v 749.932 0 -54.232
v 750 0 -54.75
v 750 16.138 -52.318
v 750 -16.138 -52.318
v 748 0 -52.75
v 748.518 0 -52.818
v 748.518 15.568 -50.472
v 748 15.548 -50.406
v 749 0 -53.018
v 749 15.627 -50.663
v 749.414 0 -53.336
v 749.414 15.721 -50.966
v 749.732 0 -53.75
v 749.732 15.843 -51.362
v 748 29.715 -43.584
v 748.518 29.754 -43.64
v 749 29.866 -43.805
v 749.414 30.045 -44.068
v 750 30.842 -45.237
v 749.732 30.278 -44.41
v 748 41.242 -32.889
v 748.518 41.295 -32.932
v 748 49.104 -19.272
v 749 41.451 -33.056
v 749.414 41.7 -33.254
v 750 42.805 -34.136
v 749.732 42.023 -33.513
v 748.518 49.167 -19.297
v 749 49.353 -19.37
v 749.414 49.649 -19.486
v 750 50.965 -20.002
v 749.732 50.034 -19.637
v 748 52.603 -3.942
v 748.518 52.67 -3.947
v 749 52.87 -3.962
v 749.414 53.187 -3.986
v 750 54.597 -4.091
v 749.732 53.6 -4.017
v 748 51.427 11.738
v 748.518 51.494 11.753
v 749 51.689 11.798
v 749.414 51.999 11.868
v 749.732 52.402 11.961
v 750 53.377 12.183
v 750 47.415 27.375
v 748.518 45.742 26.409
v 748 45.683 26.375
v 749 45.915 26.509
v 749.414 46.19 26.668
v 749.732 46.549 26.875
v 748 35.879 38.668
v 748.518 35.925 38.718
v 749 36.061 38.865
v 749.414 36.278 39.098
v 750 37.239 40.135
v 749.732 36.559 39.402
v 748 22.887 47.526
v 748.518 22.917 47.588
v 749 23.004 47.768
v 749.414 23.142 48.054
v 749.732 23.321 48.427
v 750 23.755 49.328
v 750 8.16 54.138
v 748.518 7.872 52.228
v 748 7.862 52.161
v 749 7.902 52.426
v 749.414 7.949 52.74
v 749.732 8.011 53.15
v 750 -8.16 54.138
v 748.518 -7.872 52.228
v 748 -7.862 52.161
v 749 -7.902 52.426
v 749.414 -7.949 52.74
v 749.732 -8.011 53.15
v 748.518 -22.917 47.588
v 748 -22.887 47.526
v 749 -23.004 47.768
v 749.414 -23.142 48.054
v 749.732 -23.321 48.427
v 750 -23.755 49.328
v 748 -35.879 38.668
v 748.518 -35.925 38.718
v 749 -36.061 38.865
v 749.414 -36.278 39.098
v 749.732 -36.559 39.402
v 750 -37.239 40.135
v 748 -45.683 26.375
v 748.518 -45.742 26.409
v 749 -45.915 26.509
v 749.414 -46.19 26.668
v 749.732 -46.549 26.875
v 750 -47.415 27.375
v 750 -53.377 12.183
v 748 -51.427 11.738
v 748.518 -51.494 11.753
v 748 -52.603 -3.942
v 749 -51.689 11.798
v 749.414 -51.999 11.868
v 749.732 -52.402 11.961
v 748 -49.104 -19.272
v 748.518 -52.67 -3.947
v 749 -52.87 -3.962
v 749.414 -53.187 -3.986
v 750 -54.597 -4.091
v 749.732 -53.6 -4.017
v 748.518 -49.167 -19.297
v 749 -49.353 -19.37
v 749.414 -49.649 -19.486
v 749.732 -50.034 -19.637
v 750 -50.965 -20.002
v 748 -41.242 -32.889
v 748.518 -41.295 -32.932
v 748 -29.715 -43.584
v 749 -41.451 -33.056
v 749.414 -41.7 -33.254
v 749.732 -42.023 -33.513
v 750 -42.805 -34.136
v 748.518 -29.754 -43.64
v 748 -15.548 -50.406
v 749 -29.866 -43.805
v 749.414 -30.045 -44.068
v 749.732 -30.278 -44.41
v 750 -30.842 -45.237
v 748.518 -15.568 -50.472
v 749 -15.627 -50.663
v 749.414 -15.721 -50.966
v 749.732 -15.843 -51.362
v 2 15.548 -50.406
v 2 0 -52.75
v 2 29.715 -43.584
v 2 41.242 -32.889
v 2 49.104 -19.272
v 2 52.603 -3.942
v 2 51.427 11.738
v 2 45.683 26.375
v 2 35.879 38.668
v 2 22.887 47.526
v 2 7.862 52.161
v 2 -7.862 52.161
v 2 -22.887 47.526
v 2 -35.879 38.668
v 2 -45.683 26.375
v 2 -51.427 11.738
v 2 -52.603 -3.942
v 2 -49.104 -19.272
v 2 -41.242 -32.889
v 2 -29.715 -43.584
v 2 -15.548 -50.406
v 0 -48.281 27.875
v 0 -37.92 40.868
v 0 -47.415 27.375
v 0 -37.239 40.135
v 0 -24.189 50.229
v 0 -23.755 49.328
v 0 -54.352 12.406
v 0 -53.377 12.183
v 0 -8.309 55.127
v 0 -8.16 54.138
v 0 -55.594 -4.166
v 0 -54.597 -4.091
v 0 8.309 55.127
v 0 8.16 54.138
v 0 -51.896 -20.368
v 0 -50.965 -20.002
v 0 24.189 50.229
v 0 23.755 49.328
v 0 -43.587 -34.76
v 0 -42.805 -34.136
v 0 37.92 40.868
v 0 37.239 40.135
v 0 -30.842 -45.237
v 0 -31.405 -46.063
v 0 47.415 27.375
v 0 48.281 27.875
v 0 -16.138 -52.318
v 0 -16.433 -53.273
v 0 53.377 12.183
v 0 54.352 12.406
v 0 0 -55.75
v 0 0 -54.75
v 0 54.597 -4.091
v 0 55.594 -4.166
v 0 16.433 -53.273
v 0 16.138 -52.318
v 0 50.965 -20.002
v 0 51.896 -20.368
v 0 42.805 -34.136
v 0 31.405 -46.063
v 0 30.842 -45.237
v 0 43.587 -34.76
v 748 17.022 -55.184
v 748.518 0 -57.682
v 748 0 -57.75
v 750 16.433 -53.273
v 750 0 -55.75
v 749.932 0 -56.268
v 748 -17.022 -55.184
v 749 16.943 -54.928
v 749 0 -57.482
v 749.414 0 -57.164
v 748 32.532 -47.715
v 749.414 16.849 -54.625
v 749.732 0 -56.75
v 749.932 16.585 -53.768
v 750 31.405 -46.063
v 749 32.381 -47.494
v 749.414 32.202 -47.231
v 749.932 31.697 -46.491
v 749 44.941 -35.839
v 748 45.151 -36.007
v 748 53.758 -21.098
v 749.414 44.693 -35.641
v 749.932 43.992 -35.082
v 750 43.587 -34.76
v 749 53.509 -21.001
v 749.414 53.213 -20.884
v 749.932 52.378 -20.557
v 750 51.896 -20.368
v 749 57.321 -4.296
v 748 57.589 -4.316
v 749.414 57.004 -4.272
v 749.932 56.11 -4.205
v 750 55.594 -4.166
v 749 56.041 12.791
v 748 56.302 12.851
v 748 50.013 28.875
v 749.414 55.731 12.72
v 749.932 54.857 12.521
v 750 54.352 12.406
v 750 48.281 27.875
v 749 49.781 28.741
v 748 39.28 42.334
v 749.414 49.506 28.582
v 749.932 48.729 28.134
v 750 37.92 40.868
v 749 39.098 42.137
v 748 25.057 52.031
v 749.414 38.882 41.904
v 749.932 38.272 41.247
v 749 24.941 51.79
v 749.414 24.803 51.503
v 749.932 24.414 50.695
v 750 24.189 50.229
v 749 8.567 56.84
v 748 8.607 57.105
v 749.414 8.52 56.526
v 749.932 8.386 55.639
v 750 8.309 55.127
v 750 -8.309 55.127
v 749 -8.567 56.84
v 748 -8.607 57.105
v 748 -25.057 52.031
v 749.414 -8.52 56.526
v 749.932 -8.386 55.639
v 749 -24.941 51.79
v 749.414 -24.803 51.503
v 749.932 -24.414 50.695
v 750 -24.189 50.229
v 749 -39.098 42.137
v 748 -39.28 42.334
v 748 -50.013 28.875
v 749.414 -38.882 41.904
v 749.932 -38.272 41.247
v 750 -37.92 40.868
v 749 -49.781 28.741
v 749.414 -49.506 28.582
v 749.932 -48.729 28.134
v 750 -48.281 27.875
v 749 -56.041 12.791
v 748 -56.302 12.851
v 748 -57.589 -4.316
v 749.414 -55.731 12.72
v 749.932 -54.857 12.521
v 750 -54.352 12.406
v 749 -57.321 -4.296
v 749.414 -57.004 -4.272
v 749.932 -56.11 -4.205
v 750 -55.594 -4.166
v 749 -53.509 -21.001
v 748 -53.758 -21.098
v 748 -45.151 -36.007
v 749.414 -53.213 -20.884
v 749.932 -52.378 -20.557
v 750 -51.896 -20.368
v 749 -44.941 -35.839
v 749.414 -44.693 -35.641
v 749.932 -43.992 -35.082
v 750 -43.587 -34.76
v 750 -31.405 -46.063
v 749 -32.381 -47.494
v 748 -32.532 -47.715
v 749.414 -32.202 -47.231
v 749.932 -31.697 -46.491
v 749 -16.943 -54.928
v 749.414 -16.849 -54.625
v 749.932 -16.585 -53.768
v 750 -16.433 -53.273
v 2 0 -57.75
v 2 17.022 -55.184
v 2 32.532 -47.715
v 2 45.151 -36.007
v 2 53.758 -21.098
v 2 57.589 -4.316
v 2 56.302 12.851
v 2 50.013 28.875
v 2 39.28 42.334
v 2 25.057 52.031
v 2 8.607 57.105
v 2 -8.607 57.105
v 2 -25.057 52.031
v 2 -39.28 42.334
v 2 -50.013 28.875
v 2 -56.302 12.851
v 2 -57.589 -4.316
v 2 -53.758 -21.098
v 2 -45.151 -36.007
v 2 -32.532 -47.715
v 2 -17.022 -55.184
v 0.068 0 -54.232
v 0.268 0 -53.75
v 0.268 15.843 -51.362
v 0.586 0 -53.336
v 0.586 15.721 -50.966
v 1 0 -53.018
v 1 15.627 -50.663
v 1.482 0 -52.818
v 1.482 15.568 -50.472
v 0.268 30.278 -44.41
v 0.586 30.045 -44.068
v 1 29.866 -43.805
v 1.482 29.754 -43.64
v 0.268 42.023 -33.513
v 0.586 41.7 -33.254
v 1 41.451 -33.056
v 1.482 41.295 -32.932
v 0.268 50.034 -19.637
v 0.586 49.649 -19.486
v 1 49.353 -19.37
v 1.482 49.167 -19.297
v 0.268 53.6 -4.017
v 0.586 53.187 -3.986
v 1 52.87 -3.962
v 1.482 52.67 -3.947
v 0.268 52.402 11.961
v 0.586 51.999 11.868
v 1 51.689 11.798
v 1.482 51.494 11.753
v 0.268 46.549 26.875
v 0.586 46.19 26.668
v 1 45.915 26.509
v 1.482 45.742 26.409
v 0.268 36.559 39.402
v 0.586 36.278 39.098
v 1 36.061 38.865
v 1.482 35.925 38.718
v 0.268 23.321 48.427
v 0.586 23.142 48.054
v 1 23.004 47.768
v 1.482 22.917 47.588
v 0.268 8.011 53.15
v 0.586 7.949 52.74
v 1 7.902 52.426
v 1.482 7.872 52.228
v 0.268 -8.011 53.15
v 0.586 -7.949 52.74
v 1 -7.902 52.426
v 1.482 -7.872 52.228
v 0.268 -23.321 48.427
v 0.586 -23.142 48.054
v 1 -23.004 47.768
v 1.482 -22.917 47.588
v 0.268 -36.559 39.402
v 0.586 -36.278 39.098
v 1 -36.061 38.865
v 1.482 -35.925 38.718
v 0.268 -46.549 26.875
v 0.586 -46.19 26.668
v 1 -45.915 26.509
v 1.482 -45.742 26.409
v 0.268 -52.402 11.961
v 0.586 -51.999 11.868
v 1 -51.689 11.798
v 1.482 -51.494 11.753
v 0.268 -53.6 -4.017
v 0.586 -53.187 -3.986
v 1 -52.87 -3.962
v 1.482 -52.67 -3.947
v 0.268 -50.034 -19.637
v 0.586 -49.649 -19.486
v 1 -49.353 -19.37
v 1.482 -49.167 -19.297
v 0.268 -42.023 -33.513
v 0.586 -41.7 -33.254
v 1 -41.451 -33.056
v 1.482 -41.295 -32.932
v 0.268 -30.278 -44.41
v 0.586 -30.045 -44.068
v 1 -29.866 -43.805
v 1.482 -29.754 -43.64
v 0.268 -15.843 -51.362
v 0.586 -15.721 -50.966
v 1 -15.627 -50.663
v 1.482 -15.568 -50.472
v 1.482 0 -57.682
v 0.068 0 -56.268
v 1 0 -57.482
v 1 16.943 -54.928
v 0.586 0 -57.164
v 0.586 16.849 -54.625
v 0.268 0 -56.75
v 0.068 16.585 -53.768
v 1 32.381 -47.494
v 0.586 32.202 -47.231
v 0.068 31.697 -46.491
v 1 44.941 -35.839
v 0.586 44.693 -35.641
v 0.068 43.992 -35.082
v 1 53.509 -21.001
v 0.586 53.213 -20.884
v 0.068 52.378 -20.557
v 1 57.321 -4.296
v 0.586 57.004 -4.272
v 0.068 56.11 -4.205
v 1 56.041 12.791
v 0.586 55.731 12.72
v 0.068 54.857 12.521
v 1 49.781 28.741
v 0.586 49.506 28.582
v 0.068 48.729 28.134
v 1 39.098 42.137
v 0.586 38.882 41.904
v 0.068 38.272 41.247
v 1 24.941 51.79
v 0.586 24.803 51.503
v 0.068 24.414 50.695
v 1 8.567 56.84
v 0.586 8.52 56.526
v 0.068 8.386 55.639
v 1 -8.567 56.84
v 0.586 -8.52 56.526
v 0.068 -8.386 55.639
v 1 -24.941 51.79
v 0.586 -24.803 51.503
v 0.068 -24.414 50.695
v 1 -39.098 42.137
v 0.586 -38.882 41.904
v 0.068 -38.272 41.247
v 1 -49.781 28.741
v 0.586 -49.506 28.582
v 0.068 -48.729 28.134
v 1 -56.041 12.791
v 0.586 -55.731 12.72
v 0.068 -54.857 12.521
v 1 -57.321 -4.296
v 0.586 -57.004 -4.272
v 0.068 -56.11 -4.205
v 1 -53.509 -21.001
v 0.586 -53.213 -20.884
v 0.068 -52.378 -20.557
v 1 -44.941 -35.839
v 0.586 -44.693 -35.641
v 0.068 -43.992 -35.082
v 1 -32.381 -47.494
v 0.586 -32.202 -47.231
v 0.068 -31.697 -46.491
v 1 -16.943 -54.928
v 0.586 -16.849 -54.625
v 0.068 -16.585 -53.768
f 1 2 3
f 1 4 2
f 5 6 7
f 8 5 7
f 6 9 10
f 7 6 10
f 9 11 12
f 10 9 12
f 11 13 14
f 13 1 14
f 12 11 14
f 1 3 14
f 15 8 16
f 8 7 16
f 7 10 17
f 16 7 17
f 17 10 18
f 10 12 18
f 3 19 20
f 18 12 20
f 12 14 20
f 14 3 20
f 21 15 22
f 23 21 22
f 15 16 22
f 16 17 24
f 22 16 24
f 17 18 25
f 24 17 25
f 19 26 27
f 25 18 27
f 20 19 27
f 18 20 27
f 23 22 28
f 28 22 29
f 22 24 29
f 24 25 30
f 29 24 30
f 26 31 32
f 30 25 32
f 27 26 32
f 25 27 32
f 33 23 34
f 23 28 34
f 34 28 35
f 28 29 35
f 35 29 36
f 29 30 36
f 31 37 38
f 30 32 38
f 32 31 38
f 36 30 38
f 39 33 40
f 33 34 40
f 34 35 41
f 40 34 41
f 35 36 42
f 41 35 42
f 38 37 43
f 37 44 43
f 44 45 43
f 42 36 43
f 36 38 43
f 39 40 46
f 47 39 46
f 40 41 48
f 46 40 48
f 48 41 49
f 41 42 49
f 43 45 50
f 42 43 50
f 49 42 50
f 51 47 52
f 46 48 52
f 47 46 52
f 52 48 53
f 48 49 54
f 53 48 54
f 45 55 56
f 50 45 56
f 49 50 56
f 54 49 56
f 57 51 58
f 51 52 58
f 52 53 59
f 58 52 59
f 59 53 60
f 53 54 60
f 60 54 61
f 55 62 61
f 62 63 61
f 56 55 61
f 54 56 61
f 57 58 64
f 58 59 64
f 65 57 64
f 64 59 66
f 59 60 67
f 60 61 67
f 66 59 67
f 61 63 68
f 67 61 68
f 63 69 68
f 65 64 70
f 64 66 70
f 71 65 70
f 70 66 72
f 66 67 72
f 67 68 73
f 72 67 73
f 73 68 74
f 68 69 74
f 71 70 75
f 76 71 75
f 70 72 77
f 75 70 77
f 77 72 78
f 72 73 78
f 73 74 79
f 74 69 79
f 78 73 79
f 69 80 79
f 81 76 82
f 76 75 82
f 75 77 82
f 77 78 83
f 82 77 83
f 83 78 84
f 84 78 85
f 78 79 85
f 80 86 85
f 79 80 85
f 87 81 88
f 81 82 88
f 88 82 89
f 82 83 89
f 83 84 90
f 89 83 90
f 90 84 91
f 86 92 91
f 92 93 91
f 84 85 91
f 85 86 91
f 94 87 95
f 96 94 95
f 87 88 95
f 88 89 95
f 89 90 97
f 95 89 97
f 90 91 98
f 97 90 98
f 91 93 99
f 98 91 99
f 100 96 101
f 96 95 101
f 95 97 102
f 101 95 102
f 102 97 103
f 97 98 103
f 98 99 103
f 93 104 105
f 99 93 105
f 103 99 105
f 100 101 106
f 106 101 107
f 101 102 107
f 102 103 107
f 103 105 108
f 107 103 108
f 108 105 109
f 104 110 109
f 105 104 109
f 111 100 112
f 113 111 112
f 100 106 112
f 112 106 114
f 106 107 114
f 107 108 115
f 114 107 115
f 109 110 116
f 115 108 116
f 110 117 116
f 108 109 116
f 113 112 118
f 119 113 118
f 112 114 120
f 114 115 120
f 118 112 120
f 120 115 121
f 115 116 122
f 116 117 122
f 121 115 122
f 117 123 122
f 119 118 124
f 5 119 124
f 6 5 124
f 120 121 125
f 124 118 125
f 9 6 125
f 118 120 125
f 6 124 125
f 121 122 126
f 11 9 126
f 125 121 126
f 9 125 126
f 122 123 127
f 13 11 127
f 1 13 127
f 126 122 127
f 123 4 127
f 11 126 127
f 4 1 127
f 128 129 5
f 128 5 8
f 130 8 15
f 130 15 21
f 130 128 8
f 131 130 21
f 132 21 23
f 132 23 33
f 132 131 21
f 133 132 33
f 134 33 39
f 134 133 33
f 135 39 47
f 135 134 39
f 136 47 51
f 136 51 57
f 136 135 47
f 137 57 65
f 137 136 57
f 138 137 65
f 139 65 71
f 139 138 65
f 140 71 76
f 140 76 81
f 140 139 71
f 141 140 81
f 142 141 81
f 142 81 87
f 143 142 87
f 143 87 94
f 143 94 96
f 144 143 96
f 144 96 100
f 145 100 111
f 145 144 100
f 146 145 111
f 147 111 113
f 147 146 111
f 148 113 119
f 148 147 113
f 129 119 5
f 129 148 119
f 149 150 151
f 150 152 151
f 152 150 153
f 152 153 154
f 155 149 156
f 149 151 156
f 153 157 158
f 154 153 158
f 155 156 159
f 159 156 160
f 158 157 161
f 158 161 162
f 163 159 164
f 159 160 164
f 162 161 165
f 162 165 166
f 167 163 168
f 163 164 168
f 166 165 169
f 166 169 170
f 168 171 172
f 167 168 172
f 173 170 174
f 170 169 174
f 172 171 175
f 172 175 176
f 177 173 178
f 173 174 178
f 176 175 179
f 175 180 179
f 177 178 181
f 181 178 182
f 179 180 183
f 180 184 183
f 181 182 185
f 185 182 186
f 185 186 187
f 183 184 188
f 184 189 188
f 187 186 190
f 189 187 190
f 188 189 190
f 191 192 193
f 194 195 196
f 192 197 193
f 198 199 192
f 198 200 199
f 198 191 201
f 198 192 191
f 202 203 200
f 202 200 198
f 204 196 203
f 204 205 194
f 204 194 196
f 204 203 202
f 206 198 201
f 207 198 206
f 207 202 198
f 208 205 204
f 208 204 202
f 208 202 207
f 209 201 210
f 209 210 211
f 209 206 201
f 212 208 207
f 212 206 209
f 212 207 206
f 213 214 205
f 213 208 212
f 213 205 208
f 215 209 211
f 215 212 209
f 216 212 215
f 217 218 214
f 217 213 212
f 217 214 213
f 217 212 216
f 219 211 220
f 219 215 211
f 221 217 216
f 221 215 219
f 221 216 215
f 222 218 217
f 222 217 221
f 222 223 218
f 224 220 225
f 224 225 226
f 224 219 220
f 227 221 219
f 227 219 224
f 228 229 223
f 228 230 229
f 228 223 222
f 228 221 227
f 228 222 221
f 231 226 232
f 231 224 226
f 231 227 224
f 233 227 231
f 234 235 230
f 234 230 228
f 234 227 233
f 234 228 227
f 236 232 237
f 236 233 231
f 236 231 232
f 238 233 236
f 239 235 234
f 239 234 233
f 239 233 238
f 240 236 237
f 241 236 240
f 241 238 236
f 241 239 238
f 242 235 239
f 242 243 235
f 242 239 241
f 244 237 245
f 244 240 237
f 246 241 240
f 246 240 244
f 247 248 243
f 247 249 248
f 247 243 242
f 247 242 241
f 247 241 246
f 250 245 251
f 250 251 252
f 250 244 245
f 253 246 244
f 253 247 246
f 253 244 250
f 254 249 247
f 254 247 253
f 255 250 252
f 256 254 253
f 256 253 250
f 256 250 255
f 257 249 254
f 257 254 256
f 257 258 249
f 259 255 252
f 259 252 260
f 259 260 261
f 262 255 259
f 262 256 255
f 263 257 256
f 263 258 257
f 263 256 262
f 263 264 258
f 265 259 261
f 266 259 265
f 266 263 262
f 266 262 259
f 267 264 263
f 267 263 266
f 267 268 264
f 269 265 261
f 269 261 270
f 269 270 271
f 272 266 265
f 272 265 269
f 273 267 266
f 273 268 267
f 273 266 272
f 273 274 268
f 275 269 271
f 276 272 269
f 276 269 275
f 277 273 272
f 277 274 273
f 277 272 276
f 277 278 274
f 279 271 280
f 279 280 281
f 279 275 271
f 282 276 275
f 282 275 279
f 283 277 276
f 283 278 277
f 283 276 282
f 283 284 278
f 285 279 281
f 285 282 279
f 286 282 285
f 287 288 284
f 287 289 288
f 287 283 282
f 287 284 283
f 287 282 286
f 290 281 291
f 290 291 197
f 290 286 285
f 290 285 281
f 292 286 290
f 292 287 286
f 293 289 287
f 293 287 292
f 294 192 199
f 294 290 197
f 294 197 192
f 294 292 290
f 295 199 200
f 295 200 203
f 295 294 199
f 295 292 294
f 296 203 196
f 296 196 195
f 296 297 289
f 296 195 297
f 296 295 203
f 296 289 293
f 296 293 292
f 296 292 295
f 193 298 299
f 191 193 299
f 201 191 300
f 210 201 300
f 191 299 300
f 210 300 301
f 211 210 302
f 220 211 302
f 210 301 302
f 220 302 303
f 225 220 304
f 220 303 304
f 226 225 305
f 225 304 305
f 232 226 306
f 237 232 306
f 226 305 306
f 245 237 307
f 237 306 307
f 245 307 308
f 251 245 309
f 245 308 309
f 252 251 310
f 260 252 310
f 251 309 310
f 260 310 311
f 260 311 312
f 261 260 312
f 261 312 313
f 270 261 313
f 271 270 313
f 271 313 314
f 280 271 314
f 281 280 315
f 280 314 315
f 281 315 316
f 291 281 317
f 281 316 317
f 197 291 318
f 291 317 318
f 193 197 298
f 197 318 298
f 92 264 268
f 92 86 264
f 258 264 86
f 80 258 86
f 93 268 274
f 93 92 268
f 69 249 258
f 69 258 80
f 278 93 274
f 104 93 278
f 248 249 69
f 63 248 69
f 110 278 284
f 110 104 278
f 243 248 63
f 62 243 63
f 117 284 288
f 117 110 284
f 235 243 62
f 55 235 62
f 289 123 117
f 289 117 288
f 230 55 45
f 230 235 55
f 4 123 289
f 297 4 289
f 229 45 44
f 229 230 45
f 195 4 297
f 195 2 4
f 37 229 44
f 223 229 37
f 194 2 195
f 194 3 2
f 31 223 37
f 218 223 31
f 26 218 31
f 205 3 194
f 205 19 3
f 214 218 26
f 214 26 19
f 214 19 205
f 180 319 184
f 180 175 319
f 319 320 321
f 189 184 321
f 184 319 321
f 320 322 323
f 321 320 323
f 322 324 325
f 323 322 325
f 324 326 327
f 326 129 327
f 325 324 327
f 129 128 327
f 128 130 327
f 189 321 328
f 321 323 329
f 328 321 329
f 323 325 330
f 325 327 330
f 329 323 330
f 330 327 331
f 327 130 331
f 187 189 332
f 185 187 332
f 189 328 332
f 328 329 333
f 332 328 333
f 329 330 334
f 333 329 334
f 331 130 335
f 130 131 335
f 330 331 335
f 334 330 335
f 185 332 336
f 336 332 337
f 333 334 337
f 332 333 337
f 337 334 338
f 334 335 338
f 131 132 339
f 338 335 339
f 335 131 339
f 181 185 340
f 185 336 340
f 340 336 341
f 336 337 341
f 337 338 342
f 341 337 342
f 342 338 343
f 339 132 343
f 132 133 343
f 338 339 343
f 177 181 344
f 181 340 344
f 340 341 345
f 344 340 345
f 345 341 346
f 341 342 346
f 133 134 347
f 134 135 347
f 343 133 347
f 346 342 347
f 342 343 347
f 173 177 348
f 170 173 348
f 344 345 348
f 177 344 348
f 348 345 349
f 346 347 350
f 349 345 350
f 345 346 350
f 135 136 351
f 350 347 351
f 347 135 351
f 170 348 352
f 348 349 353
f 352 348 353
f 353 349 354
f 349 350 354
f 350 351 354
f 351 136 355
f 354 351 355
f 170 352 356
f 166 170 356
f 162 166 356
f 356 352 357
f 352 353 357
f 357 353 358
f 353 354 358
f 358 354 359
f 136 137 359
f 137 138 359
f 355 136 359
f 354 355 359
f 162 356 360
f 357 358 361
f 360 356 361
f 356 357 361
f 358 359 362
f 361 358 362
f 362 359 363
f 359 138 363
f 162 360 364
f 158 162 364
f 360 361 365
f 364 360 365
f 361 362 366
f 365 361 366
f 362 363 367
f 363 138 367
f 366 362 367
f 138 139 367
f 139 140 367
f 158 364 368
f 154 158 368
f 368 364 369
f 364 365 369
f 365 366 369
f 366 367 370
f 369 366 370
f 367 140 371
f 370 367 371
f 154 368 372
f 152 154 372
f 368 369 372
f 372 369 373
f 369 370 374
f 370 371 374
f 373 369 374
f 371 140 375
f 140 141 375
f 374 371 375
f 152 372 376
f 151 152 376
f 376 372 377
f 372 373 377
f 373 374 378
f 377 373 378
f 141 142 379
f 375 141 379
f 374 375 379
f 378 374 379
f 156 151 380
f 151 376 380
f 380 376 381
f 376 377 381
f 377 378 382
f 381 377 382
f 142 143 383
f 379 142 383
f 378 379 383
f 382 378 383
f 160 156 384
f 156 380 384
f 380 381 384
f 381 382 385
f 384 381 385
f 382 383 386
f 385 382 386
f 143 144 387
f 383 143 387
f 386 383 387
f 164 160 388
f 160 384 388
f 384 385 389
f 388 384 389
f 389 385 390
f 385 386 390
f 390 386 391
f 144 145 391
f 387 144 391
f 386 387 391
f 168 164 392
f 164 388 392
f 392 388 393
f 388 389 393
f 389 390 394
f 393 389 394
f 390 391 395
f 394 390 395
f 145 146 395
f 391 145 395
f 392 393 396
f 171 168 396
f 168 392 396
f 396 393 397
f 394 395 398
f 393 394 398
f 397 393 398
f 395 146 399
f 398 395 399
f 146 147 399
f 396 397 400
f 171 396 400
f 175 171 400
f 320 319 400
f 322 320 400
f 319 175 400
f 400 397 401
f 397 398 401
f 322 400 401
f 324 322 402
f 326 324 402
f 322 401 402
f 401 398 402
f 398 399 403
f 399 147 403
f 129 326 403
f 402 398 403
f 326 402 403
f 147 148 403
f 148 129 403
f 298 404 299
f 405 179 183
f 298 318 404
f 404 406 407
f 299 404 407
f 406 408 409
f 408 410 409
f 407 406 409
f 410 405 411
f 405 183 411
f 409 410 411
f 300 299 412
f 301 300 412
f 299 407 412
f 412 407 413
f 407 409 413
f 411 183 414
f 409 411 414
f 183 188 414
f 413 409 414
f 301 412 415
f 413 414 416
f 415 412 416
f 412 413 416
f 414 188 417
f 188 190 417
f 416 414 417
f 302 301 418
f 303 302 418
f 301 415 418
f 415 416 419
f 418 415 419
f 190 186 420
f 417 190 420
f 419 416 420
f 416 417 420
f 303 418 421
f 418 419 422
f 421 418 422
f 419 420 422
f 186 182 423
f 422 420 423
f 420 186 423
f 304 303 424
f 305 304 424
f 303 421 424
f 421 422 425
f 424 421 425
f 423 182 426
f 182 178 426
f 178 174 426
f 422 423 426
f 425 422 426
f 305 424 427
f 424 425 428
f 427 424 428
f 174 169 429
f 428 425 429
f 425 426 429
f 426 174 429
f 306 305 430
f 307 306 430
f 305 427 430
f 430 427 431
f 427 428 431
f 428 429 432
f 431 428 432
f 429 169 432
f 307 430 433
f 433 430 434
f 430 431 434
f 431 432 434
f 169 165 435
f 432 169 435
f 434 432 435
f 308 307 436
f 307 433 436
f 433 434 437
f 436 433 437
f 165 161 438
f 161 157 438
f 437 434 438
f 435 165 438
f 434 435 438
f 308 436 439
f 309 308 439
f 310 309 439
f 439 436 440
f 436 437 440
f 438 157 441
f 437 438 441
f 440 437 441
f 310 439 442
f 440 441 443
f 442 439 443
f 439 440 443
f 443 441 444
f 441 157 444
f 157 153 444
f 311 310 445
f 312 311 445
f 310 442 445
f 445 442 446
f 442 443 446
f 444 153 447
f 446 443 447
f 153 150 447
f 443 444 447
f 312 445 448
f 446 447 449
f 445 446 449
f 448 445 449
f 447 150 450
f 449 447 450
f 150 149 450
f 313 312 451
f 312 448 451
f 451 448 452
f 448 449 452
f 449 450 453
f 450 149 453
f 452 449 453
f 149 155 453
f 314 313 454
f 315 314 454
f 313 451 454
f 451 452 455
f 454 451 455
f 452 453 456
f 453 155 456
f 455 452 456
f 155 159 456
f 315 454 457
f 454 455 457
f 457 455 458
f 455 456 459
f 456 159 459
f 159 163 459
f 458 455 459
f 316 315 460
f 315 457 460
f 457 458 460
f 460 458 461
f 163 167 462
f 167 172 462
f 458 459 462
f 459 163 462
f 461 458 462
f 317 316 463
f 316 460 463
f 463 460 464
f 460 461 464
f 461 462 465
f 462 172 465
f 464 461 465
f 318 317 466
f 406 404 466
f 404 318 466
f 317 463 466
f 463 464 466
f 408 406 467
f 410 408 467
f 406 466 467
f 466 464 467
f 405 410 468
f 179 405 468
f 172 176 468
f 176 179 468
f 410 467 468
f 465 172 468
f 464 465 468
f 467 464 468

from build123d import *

# Parameters (mm, degrees)
SKETCH1_R           = 57.75
SKETCH1_R_2         = 52.75
BOSS_EXTRUDE1_DEPTH = 750
FILLET1_R           = 2
FILLET2_R           = 2


with BuildPart() as part:
    # Sketch1 → Boss-Extrude1 (new body)
    with BuildSketch(Plane(origin=(0, 0, 0), x_dir=(0, 0, -1), z_dir=(1, 0, 0))):
        Circle(SKETCH1_R)
        Circle(SKETCH1_R_2, mode=Mode.SUBTRACT)
    extrude(amount=BOSS_EXTRUDE1_DEPTH)

    # Fillet1
    fillet1_edges = [part.edges().sort_by_distance(p)[0] for p in [
        (750, 0, 57.75),
        (750, 0, 52.75),
    ]]
    fillet(fillet1_edges, radius=FILLET1_R)

    # Fillet2
    fillet2_edges = [part.edges().sort_by_distance(p)[0] for p in [
        (0, 0, 57.75),
        (0, 0, 52.75),
    ]]
    fillet(fillet2_edges, radius=FILLET2_R)


solid = part.part
